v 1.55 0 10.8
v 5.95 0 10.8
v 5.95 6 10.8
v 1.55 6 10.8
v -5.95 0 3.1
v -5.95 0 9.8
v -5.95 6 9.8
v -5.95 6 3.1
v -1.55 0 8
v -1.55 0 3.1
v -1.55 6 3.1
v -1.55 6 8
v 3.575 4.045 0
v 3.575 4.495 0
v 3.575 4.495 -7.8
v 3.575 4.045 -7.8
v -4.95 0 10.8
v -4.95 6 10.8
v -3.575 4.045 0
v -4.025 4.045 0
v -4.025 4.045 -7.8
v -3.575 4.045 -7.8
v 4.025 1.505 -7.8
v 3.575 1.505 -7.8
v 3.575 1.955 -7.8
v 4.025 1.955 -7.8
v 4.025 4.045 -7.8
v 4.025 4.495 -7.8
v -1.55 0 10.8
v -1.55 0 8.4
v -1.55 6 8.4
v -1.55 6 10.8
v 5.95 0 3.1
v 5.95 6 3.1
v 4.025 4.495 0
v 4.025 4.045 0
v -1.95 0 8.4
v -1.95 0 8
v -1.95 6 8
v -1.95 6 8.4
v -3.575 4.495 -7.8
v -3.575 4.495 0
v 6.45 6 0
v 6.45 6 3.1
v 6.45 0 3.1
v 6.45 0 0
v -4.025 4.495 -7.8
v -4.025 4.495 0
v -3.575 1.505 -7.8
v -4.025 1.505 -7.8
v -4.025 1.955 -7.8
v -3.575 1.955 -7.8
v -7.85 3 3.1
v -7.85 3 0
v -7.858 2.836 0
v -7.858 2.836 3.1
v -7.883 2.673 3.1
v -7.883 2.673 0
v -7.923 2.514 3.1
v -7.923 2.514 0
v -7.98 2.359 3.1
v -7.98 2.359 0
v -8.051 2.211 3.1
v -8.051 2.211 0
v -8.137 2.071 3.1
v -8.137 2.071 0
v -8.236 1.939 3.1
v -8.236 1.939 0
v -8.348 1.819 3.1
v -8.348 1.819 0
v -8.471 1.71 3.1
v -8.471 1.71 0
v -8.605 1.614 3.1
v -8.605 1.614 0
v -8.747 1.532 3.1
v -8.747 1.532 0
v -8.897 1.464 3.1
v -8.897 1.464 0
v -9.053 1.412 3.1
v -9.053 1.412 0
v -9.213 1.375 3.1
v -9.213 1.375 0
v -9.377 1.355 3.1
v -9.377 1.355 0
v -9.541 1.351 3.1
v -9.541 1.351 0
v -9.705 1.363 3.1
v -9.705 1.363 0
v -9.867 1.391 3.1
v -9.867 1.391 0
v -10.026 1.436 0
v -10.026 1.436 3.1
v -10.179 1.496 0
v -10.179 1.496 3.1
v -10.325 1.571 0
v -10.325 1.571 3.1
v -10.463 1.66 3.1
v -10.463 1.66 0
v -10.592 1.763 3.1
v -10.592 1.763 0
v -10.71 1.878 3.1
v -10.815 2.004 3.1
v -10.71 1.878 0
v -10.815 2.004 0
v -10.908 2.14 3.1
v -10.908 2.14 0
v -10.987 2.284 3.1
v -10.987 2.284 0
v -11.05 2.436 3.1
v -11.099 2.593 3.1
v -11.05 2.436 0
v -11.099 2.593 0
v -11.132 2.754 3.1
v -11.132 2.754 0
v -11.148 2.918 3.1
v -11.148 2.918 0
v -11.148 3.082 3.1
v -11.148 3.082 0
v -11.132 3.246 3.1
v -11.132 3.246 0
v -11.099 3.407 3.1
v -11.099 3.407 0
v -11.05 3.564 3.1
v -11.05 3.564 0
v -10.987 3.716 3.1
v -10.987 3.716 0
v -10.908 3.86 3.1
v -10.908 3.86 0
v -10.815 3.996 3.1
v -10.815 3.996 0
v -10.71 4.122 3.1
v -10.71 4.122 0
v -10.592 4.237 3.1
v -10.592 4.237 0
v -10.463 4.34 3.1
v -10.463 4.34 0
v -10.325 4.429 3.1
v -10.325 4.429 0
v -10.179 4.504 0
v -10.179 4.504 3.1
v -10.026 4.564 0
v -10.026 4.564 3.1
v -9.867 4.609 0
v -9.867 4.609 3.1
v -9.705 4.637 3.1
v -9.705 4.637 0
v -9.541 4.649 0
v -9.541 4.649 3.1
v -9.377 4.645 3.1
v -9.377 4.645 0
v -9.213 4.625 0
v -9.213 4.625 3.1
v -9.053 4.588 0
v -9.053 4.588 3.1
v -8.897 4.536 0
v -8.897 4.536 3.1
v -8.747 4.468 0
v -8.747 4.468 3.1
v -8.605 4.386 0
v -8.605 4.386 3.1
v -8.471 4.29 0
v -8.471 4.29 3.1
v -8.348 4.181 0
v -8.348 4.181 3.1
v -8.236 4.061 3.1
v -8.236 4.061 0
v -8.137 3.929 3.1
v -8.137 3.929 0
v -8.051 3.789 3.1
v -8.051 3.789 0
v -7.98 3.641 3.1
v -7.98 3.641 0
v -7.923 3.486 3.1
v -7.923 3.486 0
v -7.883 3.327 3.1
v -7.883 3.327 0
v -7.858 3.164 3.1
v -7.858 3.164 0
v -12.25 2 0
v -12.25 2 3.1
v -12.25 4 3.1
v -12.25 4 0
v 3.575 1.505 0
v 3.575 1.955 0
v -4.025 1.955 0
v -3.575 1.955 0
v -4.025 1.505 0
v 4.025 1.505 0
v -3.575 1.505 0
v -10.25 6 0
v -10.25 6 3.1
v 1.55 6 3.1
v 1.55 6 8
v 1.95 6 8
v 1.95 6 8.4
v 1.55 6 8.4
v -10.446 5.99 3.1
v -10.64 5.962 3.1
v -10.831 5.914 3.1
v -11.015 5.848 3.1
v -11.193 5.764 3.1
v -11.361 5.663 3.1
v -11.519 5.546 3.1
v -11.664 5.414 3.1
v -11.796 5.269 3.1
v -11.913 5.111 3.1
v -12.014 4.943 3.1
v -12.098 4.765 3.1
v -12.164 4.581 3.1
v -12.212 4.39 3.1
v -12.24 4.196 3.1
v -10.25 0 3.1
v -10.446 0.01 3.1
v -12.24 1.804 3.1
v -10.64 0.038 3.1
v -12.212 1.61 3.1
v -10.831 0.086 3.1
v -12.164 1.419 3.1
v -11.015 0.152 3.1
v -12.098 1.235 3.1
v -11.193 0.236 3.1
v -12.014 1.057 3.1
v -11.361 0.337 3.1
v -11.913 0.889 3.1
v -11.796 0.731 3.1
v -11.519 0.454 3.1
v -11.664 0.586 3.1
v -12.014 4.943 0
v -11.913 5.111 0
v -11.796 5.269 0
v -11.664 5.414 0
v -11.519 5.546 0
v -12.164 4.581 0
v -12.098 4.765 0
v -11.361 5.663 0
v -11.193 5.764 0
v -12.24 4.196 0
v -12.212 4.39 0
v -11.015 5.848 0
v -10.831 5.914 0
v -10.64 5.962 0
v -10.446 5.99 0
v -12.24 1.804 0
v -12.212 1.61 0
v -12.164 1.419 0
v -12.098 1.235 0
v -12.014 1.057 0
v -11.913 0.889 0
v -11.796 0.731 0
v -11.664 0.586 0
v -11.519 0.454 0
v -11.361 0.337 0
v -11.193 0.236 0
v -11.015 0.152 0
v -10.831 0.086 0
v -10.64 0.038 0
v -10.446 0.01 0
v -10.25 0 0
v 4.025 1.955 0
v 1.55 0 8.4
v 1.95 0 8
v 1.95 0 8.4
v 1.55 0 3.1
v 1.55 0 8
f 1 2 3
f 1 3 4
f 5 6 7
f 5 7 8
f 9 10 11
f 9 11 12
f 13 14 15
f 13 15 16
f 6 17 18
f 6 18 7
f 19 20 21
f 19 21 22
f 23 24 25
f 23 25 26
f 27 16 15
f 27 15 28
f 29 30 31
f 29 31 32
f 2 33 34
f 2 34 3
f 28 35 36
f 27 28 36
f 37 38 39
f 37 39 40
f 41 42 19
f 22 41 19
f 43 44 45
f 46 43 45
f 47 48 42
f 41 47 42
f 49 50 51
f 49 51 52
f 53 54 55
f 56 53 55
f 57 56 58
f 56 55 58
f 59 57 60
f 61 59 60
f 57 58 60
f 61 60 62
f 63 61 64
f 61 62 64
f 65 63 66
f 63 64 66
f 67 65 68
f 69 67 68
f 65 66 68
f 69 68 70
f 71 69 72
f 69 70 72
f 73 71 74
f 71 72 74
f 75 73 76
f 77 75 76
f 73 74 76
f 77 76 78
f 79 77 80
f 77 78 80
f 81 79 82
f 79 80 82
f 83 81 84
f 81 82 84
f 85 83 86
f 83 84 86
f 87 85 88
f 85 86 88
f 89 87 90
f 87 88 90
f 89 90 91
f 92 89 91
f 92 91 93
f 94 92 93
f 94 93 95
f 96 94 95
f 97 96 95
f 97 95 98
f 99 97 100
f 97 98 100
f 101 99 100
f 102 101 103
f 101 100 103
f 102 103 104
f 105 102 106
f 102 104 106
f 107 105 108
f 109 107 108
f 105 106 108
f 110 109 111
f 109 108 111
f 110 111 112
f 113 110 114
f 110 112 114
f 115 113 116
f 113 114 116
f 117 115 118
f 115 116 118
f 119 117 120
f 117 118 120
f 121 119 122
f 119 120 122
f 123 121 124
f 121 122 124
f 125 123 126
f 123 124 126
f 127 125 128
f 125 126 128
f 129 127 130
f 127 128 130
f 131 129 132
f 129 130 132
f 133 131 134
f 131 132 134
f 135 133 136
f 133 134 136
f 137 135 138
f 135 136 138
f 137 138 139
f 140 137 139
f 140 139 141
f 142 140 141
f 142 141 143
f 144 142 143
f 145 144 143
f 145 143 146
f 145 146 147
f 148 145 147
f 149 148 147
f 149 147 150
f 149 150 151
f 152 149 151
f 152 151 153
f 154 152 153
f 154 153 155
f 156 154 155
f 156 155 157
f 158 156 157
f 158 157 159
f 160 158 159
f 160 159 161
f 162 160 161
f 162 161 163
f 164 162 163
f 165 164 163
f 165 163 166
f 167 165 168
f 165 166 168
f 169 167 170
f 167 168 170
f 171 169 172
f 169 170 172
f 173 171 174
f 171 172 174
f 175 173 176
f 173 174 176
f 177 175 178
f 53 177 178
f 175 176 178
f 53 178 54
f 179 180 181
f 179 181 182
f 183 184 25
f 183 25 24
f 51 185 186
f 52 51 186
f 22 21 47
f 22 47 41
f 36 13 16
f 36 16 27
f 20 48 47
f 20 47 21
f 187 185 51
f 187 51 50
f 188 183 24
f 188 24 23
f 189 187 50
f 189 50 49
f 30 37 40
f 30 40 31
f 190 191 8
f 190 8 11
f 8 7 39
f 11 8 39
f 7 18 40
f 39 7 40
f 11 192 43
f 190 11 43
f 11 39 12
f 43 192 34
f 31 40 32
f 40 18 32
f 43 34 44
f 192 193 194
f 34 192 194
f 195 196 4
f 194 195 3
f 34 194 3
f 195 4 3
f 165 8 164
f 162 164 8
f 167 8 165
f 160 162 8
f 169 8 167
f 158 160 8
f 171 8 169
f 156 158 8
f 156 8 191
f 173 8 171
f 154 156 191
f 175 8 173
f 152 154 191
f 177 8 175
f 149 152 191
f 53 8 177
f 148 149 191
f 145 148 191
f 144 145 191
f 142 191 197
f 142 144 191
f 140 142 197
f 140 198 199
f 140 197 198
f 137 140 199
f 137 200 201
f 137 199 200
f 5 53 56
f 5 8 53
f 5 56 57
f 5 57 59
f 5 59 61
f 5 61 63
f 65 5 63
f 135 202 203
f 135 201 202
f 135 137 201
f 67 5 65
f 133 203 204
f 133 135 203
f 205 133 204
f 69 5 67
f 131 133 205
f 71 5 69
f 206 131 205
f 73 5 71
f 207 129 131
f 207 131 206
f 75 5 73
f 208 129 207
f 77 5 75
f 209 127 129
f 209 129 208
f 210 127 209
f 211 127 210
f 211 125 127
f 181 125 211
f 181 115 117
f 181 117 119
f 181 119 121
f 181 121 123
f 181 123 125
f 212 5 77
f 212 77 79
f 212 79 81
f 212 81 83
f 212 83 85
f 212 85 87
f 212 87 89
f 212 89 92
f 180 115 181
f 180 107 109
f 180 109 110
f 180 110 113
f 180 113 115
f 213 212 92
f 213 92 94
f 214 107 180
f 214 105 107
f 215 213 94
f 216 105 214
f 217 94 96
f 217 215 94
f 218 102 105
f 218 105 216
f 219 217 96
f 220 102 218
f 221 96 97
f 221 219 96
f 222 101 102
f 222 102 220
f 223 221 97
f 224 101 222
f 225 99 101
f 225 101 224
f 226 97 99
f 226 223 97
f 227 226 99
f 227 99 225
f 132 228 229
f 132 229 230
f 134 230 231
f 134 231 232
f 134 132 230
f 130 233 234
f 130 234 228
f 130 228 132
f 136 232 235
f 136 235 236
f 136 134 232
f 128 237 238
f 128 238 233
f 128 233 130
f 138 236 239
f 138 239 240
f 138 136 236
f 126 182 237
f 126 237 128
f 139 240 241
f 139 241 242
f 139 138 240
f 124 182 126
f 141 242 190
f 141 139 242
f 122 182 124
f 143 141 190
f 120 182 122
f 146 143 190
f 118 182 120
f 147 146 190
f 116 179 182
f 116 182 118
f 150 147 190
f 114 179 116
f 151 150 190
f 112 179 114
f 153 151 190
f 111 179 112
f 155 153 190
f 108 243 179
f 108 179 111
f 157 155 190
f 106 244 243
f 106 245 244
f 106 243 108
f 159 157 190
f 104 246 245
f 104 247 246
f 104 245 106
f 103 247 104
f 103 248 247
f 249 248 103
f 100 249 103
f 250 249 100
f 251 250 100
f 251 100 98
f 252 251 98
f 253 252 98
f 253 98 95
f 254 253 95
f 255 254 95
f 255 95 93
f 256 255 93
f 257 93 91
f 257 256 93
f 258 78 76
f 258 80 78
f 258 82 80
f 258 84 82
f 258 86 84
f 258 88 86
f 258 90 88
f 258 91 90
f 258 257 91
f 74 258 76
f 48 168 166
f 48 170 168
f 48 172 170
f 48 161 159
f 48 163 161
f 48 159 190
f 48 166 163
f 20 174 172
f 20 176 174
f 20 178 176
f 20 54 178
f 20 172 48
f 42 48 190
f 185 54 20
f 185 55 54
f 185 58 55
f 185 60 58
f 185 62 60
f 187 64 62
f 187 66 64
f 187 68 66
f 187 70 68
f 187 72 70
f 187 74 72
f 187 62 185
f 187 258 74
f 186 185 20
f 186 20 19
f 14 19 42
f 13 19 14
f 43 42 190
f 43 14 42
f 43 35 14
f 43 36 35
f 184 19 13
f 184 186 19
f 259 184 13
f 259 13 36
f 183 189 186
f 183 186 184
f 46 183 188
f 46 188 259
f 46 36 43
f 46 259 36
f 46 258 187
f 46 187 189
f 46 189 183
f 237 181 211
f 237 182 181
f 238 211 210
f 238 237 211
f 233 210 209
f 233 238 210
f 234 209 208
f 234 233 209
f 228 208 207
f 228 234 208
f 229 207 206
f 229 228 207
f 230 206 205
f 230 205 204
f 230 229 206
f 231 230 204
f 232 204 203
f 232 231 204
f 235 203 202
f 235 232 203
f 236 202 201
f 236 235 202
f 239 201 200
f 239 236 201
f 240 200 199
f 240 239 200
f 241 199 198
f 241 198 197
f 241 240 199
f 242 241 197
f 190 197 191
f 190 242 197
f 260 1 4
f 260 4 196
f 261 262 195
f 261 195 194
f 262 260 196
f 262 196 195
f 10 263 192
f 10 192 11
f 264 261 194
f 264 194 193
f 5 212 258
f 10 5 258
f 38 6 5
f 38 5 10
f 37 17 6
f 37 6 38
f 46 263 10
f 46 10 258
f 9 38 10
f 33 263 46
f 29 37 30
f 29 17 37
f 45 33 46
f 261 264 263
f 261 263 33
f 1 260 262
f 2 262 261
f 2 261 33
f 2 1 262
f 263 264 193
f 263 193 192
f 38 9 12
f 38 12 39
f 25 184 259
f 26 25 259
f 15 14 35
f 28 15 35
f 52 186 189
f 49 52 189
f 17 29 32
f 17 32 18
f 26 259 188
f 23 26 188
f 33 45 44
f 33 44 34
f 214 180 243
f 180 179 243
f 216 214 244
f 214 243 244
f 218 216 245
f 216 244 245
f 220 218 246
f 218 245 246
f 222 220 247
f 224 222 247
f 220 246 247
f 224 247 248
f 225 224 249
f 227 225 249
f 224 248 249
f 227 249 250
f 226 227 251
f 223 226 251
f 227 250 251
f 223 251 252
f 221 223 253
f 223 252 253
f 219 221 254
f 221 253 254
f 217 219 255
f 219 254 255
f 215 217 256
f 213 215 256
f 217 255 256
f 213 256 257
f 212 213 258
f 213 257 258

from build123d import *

# Parameters (mm, degrees)
F1_DEPTH = 6
F2_R     = 2
F3_R     = 1.65
F4_DEPTH = 3.1
F3_W     = 0.45
F3_H     = 0.45
F5_DEPTH = 7.8
F6_R     = 1.65
F7_DEPTH = 3.1


with BuildPart() as f1:
    # F0 (on Front) → F1 (new body)
    with BuildSketch(Plane.XZ):
        Polygon((-12.25, 0), (12.25, 0), (12.25, 3.1), (5.95, 3.1), (5.95, 10.8), (1.55, 10.8), (1.55, 8.4), (1.95, 8.4), (1.95, 8), (1.55, 8), (1.55, 3.1), (-1.55, 3.1), (-1.55, 8), (-1.95, 8), (-1.95, 8.4), (-1.55, 8.4), (-1.55, 10.8), (-4.95, 10.8), (-5.95, 9.8), (-5.95, 3.1), (-12.25, 3.1), align=None)
    extrude(amount=-F1_DEPTH)

    # F2
    f2_edges = [f1.edges().sort_by_distance(p)[0] for p in [
        (-12.25, 0, 1.55),
        (12.25, 0, 1.55),
        (12.25, 6, 1.55),
        (-12.25, 6, 1.55),
    ]]
    fillet(f2_edges, radius=F2_R)

    # F3 (on face) → F4 (cut, through all)
    with BuildSketch(Plane(origin=(0, 0, 0), x_dir=(1, 0, 0), z_dir=(0, 0, -1))):
        with Locations((-9.5, -3)):
            Circle(F3_R)
        with Locations((9.5, -3)):
            Circle(F3_R)
    extrude(amount=-F4_DEPTH, mode=Mode.SUBTRACT)

    # F3 (on face) → F5 (join)
    with BuildSketch(Plane(origin=(0, 0, 0), x_dir=(1, 0, 0), z_dir=(0, 0, -1))):
        with Locations((-3.8, -1.73)):
            Rectangle(F3_W, F3_H)
        with Locations((-3.8, -4.27)):
            Rectangle(F3_W, F3_H)
        with Locations((3.8, -4.27)):
            Rectangle(F3_W, F3_H)
        with Locations((3.8, -1.73)):
            Rectangle(F3_W, F3_H)
    extrude(amount=F5_DEPTH)

    # F6 (on face) → F7 (cut, through all)
    with BuildSketch(Plane.XY.offset(3.1)):
        with BuildLine():
            Line((10.25, 6), (6.45, 6))
            Line((6.45, 6), (6.45, 0))
            Line((6.45, 0), (10.25, 0))
            ThreePointArc((10.25, 0), (11.6642135624, 0.5857864376), (12.25, 2))
            Line((12.25, 2), (12.25, 4))
            ThreePointArc((12.25, 4), (11.6642135624, 5.4142135624), (10.25, 6))
        make_face()
        with Locations((9.5, 3)):
            Circle(F6_R, mode=Mode.SUBTRACT)
    extrude(amount=-F7_DEPTH, mode=Mode.SUBTRACT)


solid = f1.part
